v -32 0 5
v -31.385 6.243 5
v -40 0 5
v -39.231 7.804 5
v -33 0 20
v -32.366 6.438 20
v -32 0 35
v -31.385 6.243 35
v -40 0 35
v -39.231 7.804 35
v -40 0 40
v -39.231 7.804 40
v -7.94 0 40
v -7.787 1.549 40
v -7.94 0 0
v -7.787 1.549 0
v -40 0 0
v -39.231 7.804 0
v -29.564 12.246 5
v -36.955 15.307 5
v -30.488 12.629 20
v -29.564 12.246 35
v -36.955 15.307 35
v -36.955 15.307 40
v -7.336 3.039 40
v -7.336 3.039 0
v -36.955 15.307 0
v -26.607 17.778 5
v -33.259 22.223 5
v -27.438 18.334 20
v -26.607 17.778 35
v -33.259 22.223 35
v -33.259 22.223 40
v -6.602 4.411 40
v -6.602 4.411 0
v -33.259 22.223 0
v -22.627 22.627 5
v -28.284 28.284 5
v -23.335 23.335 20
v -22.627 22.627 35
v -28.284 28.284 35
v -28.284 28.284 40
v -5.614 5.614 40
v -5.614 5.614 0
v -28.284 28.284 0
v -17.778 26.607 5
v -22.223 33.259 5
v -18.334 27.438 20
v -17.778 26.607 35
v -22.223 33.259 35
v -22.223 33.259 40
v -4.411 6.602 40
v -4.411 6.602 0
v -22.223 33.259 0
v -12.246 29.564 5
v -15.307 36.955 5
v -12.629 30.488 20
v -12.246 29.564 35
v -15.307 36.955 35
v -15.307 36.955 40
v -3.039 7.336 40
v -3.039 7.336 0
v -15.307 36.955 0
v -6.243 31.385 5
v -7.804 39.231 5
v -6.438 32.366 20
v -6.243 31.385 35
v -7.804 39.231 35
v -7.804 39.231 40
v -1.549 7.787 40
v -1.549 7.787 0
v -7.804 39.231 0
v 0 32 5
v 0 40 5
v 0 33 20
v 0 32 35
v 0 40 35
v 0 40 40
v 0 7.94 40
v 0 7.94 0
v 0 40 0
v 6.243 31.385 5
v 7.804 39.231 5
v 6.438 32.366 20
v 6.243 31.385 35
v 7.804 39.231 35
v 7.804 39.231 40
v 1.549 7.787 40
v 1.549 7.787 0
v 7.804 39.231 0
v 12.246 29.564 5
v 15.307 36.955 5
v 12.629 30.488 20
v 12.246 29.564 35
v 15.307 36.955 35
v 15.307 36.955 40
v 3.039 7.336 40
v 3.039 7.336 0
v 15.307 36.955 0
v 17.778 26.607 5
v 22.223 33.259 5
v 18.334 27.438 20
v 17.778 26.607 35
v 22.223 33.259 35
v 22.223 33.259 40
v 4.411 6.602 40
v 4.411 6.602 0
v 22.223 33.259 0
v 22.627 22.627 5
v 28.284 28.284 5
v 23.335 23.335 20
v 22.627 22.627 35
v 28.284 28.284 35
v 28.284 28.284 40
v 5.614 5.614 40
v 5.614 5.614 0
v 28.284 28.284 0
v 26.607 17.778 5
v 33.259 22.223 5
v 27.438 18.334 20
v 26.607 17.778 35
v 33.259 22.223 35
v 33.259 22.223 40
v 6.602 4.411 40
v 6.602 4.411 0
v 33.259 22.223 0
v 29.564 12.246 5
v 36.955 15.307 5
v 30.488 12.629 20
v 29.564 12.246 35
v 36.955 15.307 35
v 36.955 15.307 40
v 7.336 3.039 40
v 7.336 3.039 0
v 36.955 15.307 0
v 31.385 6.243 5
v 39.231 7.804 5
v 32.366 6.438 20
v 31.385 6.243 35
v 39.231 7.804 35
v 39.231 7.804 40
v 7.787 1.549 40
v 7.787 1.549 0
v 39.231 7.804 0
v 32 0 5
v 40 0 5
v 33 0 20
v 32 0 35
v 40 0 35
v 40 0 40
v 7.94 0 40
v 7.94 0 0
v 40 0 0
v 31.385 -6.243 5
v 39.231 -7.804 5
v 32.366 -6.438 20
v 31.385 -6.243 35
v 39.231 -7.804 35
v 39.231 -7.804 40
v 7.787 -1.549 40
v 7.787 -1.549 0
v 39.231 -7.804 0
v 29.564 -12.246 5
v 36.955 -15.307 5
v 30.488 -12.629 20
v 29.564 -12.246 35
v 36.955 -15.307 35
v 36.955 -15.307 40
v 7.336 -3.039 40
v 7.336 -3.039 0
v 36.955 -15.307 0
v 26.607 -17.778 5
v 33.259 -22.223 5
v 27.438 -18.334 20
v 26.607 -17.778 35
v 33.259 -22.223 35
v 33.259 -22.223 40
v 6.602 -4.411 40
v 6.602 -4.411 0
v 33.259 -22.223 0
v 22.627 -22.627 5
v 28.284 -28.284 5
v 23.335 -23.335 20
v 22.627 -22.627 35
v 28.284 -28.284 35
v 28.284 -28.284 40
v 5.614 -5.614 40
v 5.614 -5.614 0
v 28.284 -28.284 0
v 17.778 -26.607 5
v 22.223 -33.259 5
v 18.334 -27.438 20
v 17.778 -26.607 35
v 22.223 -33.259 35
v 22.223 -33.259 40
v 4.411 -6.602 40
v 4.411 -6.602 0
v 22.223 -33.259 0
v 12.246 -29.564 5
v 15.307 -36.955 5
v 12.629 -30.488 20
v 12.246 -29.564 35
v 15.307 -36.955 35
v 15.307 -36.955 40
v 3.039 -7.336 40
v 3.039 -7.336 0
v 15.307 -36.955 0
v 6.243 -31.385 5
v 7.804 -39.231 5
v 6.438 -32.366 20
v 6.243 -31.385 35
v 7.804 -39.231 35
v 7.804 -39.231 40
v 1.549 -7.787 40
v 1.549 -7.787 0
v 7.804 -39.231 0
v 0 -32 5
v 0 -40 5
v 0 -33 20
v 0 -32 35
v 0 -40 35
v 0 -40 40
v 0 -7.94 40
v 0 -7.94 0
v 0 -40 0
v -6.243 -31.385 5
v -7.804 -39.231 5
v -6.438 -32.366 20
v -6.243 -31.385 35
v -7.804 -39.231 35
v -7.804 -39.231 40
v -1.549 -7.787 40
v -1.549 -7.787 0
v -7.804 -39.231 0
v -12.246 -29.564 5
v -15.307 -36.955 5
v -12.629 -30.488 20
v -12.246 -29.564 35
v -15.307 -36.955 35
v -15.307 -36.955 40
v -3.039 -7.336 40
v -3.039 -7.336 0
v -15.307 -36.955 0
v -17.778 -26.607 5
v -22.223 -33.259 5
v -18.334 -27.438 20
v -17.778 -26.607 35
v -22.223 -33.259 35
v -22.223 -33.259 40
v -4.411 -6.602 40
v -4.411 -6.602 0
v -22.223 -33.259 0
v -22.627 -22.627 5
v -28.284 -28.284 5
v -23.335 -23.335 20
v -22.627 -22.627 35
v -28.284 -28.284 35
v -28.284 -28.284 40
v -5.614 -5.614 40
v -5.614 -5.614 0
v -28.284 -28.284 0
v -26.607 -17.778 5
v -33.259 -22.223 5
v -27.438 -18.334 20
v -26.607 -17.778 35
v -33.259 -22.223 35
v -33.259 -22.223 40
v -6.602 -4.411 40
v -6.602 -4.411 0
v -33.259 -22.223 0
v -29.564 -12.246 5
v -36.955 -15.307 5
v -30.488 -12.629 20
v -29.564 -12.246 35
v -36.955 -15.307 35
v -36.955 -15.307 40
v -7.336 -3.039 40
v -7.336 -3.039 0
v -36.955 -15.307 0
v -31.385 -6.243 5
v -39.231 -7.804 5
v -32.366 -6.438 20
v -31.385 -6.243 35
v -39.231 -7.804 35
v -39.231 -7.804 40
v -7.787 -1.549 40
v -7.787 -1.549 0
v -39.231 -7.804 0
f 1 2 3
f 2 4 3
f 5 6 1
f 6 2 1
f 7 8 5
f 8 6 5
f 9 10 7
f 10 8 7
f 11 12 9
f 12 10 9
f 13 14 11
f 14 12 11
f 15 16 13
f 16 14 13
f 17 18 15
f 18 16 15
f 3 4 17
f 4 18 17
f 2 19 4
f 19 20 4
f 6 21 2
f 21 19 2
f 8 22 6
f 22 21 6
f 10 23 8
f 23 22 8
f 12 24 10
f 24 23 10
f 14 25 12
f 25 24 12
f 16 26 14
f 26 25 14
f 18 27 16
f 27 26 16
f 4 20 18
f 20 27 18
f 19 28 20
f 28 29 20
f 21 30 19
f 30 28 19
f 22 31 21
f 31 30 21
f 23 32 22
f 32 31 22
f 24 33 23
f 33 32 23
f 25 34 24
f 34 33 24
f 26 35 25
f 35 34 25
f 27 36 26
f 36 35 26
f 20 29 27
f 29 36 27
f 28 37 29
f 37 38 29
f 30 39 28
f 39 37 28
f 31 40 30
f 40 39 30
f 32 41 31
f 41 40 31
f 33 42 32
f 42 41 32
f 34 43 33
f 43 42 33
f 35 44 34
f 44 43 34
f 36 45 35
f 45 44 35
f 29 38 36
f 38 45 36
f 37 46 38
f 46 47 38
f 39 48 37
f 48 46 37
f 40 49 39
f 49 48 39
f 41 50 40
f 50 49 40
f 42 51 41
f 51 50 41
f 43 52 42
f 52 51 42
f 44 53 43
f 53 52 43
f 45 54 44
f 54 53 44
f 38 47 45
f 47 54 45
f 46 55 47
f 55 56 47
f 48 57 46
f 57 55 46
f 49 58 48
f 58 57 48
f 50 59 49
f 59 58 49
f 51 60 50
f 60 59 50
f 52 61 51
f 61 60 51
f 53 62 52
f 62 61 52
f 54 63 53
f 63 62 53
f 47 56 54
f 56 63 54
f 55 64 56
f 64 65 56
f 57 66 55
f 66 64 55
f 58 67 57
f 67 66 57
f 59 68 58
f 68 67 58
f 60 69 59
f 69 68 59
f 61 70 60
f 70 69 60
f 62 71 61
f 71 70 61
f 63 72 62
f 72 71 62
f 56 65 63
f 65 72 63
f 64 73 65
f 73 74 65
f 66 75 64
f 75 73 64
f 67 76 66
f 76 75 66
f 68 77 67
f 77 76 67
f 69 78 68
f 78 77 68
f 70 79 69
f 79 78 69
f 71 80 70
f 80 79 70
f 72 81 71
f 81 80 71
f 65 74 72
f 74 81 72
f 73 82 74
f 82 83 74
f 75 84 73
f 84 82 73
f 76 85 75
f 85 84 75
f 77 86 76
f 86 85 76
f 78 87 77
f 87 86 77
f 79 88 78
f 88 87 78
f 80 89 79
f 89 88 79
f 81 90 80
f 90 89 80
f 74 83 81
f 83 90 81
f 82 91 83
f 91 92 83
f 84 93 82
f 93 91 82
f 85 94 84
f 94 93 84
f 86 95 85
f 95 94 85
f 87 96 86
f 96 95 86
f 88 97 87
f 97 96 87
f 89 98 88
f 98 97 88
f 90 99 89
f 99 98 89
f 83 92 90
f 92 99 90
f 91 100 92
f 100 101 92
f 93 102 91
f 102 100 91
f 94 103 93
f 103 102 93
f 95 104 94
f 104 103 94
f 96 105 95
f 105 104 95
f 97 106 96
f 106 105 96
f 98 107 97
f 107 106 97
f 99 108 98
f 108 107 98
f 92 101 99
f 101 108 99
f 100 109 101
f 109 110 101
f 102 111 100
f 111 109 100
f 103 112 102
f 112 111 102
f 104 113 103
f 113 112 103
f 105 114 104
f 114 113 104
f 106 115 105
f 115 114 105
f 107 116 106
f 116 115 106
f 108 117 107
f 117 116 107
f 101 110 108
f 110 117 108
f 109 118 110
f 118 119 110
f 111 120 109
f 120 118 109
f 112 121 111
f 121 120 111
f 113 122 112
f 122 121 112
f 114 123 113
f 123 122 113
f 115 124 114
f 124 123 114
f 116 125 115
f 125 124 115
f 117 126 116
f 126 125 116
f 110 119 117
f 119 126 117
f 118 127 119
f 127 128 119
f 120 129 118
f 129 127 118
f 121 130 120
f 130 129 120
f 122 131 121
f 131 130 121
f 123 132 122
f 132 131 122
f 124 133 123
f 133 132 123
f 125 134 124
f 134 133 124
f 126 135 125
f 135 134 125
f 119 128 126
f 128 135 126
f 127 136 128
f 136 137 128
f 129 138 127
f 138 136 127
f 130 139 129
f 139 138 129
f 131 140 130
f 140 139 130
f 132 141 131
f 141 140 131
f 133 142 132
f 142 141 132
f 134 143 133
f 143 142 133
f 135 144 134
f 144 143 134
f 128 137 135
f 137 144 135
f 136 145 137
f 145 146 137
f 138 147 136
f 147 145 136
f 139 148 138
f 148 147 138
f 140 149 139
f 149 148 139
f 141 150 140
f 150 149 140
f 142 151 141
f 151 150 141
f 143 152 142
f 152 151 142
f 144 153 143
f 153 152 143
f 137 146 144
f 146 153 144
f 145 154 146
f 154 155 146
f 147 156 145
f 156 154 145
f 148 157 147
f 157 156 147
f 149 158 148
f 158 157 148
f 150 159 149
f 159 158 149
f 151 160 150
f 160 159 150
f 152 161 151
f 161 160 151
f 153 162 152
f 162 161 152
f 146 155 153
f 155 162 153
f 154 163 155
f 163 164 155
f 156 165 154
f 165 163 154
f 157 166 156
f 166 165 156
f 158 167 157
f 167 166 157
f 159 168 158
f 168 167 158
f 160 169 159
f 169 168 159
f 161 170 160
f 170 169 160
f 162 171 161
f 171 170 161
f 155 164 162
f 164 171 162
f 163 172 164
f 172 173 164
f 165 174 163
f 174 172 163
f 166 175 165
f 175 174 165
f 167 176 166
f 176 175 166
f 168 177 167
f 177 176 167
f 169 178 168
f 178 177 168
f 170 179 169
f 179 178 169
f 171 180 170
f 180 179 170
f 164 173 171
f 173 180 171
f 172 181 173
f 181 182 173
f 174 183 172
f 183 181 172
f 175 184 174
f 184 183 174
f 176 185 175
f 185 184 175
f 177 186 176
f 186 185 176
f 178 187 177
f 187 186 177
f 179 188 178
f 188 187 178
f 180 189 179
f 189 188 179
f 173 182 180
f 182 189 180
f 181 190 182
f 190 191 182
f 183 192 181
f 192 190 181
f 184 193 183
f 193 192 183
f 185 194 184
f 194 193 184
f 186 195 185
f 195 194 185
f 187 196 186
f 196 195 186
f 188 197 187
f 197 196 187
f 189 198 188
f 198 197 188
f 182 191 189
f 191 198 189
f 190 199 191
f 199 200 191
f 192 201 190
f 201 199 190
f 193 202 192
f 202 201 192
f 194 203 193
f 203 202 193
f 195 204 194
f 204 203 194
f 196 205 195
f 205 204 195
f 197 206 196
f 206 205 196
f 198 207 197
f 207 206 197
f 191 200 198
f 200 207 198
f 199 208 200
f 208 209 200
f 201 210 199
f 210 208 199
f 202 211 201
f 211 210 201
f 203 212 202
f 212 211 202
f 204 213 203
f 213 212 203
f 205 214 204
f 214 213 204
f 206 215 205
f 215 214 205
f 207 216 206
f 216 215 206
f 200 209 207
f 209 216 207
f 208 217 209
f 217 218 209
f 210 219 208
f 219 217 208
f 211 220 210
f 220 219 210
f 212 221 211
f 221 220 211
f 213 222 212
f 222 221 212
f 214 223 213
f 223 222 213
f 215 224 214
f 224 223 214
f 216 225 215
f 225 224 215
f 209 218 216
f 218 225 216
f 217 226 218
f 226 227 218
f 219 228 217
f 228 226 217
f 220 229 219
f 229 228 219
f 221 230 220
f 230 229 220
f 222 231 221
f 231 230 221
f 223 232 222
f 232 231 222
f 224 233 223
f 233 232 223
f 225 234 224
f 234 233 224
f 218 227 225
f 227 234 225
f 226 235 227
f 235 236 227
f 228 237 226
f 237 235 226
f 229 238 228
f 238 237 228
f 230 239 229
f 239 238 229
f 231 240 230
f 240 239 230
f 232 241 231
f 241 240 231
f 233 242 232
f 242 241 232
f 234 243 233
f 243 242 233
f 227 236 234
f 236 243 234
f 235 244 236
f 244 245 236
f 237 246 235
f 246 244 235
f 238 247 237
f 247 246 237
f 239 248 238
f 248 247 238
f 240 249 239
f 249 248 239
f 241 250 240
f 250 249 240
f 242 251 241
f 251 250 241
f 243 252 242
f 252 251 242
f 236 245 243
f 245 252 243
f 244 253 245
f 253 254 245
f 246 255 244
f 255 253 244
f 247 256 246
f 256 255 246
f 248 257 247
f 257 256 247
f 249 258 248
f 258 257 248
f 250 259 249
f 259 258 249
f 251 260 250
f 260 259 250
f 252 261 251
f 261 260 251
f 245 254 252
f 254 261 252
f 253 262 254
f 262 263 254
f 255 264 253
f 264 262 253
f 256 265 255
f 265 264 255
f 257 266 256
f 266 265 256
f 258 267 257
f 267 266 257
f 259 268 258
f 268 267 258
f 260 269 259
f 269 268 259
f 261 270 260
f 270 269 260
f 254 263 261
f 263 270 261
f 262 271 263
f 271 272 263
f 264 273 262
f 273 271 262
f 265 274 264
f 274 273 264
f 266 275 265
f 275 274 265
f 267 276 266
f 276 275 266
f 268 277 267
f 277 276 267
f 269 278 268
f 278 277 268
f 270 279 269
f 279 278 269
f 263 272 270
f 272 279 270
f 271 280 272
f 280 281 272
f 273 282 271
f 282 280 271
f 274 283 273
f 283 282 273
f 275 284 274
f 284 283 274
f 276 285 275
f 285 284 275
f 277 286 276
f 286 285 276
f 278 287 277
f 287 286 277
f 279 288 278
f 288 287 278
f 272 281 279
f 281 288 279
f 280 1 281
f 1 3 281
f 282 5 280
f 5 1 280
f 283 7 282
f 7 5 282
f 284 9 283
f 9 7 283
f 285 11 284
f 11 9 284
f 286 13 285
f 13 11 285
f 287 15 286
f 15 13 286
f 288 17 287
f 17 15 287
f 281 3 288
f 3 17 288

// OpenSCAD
$fn = 32;

// ----------------------------------------------------------------------
// Belt roller: 64 mm barrel, 40 mm wide, bore 15.88 mm
// ----------------------------------------------------------------------

// --- parameters (mm) ---
bore_d = 15.88;           // bore
barrel_d = 64;            // barrel diameter
roller_w = 40;            // roller width
flange_d = 80;            // flange diameter
flange_t = 5;             // flange thickness
hub_d = 31.88;            // hub diameter

roller_profile = [[7.94, 0], [40, 0], [40, 5], [32, 5], [33, 20], [32, 35], [40, 35], [40, 40], [7.94, 40]];

/* the profile stays clear of the axis, so the bore comes out of the revolve */
rotate_extrude() polygon(roller_profile);
